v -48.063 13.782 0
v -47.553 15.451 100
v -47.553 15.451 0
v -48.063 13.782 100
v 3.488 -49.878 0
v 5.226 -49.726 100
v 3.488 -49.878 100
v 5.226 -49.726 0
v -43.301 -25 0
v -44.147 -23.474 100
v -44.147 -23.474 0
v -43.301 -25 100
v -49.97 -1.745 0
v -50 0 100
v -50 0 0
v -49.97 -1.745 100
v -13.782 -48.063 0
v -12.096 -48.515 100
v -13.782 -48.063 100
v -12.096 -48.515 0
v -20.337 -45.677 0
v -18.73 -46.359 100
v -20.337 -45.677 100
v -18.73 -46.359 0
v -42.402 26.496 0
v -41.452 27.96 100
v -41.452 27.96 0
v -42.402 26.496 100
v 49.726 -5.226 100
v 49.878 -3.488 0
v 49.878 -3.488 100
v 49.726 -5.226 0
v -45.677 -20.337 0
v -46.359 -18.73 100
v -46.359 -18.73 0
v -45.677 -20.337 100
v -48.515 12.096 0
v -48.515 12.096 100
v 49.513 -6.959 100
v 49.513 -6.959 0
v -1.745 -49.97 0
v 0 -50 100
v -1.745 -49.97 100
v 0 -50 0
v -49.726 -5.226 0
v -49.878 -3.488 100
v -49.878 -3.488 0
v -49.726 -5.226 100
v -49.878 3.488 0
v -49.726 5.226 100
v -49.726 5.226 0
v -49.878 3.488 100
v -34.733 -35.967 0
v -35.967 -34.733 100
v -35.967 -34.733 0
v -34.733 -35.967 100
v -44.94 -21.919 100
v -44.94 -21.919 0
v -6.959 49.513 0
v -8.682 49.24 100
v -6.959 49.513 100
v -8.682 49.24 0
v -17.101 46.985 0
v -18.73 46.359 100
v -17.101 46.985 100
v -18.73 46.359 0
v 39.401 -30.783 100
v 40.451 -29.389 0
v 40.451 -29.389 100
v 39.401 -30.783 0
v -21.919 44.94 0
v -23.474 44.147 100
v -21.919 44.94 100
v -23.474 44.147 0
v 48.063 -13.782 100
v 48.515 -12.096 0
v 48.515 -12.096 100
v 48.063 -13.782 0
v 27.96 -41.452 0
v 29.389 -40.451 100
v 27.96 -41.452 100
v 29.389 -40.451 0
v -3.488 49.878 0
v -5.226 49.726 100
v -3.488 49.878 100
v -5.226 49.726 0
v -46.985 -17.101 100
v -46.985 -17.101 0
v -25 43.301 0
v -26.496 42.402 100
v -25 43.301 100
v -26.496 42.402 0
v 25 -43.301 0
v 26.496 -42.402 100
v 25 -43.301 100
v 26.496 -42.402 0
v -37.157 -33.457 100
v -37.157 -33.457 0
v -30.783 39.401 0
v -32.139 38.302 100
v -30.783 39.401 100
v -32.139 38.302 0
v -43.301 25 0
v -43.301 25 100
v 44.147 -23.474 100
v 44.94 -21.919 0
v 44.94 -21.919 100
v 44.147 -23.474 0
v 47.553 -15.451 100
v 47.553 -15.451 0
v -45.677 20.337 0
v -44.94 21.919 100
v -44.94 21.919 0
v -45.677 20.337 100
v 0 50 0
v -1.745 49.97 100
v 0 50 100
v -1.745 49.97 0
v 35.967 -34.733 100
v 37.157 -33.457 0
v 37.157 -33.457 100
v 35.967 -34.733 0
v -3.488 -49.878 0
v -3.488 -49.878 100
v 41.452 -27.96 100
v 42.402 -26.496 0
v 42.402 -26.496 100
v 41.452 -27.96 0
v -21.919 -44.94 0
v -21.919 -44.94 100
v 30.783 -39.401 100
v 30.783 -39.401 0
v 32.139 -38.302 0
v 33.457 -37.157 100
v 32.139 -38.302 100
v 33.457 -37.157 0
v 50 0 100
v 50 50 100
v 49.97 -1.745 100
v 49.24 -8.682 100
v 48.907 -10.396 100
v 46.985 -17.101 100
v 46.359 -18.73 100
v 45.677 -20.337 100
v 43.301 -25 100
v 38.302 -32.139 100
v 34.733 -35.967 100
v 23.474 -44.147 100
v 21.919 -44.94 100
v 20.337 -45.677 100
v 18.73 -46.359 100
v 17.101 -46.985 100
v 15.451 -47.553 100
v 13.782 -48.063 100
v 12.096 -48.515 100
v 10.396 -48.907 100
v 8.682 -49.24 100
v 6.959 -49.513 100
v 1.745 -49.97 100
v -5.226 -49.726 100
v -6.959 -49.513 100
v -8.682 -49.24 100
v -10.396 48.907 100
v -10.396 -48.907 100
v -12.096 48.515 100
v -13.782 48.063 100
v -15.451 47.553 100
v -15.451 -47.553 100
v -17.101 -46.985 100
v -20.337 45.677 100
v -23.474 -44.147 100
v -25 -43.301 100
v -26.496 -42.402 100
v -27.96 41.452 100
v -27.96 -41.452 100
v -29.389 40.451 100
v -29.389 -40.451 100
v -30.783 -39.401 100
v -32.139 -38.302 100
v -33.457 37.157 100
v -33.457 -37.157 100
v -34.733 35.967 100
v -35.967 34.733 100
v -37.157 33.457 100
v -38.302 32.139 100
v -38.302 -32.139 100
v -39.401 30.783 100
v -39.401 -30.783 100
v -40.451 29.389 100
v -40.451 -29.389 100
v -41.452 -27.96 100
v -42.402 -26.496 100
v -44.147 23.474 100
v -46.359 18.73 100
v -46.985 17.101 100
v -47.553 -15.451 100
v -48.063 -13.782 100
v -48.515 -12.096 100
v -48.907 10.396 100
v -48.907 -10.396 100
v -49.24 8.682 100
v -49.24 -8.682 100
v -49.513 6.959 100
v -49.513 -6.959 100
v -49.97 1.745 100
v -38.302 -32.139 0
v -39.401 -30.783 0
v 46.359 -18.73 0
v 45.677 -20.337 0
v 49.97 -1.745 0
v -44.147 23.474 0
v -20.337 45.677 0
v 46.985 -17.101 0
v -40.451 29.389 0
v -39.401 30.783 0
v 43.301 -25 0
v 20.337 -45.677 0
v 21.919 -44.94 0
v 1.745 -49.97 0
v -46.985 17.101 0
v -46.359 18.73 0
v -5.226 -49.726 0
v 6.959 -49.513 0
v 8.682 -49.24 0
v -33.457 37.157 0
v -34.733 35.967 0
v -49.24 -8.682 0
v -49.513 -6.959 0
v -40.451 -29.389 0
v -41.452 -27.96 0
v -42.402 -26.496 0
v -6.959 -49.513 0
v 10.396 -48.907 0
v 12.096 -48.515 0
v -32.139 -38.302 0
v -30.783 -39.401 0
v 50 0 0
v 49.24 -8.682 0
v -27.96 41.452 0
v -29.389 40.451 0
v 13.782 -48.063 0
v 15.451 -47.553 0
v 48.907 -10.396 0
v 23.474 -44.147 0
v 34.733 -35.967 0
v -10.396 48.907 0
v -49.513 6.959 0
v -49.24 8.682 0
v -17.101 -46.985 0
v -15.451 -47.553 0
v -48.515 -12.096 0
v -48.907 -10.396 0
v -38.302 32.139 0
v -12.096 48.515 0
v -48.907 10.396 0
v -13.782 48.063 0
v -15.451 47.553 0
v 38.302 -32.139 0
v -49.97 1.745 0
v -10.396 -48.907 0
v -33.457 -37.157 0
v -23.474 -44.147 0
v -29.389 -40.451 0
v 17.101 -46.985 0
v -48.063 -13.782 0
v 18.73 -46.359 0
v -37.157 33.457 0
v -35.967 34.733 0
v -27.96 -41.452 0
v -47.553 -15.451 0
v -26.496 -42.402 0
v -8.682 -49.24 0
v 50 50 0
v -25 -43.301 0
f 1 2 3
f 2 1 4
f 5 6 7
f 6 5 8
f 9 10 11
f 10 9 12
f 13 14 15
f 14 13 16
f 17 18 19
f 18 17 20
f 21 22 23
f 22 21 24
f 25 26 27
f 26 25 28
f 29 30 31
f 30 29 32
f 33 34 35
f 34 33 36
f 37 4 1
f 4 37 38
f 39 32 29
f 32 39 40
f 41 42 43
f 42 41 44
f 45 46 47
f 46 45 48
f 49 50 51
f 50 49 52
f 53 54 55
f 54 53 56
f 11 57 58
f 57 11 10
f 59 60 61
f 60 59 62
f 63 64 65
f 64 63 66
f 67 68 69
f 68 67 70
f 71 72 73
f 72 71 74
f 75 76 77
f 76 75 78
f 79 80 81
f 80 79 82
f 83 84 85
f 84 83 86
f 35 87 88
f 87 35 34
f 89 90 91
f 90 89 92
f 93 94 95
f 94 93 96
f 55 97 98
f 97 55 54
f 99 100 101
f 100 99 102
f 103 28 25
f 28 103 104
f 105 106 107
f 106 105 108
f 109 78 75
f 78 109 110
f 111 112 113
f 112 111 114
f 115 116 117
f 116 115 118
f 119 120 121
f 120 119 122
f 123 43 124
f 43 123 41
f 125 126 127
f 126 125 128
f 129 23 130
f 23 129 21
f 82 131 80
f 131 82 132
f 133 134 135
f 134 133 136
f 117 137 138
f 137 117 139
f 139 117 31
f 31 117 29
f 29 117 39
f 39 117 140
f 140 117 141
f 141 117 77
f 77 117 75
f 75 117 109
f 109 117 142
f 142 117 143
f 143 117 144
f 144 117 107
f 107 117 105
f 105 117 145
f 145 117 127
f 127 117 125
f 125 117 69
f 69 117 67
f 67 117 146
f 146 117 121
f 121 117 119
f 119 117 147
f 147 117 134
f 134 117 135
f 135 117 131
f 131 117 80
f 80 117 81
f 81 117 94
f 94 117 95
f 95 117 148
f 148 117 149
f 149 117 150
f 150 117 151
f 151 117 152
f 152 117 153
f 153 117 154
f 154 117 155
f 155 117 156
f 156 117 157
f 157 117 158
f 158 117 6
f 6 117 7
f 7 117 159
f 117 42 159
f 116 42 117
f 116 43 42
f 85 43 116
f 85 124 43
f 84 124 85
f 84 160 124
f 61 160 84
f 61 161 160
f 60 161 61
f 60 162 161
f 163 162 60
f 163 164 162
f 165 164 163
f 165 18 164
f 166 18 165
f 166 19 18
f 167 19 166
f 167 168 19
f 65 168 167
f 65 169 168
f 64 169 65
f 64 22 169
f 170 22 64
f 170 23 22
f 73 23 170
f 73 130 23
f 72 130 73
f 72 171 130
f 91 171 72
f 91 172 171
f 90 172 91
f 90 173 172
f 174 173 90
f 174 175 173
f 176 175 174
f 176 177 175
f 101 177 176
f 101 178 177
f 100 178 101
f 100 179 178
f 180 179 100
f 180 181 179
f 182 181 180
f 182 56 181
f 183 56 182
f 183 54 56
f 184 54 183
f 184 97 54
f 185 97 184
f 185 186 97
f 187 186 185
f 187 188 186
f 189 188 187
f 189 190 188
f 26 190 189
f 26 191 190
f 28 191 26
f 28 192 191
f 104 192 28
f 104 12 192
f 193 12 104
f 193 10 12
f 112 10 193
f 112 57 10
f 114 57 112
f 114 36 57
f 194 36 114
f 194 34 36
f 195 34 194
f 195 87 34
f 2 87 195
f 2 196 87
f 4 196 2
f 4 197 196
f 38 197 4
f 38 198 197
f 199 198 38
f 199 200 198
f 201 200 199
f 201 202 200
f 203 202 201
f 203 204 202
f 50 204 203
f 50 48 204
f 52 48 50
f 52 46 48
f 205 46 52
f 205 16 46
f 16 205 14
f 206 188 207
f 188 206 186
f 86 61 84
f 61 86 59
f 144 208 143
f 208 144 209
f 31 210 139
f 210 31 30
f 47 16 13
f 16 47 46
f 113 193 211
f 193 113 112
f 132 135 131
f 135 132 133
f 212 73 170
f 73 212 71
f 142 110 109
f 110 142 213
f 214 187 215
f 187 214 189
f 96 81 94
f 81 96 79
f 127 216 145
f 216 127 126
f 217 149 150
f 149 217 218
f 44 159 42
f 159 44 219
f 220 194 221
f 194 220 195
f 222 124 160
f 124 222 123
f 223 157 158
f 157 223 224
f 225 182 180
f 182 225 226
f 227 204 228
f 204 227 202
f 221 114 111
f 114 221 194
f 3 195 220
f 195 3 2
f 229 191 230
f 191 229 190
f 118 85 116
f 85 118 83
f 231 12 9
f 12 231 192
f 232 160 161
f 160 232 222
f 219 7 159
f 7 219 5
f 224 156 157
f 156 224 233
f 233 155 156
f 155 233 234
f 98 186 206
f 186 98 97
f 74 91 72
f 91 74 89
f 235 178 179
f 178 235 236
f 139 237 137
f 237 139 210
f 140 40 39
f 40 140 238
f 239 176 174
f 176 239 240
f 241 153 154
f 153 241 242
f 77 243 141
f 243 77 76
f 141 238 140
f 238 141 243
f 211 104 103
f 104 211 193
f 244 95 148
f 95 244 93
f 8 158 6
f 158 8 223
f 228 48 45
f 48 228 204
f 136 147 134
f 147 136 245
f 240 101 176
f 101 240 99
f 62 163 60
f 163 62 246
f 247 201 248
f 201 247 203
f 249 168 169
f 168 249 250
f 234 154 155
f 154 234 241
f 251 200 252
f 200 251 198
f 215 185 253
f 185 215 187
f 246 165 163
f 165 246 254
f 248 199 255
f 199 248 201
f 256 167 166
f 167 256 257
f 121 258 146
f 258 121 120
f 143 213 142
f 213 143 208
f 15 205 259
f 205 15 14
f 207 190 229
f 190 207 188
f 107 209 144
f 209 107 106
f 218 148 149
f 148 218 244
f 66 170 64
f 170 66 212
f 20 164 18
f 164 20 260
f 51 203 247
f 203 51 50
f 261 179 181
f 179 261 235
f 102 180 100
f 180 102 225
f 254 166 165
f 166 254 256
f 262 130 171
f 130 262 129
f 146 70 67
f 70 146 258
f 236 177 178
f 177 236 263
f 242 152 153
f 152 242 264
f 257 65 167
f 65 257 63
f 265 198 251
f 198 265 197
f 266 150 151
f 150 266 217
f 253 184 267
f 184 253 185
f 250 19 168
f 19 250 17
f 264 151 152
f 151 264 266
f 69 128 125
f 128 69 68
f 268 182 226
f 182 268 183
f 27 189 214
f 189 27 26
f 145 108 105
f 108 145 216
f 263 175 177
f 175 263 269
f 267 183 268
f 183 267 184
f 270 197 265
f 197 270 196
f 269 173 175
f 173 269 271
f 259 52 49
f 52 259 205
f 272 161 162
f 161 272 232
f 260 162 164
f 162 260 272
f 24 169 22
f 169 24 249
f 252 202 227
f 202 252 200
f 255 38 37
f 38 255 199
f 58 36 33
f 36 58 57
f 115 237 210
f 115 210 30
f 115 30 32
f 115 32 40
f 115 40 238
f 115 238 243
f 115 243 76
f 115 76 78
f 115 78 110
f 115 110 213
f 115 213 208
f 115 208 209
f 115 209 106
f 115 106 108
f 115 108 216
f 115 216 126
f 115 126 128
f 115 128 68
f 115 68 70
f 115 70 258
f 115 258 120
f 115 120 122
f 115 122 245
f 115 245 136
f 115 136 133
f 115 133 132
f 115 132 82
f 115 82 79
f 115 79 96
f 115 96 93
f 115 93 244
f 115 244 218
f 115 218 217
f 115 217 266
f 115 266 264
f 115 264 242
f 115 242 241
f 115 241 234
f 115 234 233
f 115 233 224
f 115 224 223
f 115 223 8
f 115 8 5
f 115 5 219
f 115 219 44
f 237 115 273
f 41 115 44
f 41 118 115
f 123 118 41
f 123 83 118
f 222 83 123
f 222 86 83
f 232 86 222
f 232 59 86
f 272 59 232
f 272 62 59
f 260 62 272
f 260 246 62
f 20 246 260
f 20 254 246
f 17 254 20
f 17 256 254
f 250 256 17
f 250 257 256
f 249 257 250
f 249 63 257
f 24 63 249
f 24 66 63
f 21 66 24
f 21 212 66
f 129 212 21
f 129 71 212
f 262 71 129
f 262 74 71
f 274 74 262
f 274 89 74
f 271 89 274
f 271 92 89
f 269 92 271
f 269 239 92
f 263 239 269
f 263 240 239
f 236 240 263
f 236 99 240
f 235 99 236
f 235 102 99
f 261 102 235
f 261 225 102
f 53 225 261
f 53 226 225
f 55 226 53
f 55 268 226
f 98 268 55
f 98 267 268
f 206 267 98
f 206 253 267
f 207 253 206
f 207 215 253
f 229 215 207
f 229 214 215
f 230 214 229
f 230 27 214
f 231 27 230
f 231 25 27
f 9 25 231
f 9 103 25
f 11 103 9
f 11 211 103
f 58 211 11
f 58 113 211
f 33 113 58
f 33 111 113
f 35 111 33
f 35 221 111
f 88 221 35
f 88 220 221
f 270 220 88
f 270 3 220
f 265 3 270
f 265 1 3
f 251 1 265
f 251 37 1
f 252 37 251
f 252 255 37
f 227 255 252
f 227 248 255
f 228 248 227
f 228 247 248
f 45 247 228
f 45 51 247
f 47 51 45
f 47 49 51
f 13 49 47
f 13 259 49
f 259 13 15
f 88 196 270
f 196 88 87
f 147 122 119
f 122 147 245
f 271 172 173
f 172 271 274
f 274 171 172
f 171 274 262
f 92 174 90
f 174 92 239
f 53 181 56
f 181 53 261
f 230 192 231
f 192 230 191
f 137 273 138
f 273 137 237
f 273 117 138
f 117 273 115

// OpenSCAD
$fs=0.3; 
$fa=2; 

union() {
cylinder(100,50,50);
cube([50,50,100]);
}
